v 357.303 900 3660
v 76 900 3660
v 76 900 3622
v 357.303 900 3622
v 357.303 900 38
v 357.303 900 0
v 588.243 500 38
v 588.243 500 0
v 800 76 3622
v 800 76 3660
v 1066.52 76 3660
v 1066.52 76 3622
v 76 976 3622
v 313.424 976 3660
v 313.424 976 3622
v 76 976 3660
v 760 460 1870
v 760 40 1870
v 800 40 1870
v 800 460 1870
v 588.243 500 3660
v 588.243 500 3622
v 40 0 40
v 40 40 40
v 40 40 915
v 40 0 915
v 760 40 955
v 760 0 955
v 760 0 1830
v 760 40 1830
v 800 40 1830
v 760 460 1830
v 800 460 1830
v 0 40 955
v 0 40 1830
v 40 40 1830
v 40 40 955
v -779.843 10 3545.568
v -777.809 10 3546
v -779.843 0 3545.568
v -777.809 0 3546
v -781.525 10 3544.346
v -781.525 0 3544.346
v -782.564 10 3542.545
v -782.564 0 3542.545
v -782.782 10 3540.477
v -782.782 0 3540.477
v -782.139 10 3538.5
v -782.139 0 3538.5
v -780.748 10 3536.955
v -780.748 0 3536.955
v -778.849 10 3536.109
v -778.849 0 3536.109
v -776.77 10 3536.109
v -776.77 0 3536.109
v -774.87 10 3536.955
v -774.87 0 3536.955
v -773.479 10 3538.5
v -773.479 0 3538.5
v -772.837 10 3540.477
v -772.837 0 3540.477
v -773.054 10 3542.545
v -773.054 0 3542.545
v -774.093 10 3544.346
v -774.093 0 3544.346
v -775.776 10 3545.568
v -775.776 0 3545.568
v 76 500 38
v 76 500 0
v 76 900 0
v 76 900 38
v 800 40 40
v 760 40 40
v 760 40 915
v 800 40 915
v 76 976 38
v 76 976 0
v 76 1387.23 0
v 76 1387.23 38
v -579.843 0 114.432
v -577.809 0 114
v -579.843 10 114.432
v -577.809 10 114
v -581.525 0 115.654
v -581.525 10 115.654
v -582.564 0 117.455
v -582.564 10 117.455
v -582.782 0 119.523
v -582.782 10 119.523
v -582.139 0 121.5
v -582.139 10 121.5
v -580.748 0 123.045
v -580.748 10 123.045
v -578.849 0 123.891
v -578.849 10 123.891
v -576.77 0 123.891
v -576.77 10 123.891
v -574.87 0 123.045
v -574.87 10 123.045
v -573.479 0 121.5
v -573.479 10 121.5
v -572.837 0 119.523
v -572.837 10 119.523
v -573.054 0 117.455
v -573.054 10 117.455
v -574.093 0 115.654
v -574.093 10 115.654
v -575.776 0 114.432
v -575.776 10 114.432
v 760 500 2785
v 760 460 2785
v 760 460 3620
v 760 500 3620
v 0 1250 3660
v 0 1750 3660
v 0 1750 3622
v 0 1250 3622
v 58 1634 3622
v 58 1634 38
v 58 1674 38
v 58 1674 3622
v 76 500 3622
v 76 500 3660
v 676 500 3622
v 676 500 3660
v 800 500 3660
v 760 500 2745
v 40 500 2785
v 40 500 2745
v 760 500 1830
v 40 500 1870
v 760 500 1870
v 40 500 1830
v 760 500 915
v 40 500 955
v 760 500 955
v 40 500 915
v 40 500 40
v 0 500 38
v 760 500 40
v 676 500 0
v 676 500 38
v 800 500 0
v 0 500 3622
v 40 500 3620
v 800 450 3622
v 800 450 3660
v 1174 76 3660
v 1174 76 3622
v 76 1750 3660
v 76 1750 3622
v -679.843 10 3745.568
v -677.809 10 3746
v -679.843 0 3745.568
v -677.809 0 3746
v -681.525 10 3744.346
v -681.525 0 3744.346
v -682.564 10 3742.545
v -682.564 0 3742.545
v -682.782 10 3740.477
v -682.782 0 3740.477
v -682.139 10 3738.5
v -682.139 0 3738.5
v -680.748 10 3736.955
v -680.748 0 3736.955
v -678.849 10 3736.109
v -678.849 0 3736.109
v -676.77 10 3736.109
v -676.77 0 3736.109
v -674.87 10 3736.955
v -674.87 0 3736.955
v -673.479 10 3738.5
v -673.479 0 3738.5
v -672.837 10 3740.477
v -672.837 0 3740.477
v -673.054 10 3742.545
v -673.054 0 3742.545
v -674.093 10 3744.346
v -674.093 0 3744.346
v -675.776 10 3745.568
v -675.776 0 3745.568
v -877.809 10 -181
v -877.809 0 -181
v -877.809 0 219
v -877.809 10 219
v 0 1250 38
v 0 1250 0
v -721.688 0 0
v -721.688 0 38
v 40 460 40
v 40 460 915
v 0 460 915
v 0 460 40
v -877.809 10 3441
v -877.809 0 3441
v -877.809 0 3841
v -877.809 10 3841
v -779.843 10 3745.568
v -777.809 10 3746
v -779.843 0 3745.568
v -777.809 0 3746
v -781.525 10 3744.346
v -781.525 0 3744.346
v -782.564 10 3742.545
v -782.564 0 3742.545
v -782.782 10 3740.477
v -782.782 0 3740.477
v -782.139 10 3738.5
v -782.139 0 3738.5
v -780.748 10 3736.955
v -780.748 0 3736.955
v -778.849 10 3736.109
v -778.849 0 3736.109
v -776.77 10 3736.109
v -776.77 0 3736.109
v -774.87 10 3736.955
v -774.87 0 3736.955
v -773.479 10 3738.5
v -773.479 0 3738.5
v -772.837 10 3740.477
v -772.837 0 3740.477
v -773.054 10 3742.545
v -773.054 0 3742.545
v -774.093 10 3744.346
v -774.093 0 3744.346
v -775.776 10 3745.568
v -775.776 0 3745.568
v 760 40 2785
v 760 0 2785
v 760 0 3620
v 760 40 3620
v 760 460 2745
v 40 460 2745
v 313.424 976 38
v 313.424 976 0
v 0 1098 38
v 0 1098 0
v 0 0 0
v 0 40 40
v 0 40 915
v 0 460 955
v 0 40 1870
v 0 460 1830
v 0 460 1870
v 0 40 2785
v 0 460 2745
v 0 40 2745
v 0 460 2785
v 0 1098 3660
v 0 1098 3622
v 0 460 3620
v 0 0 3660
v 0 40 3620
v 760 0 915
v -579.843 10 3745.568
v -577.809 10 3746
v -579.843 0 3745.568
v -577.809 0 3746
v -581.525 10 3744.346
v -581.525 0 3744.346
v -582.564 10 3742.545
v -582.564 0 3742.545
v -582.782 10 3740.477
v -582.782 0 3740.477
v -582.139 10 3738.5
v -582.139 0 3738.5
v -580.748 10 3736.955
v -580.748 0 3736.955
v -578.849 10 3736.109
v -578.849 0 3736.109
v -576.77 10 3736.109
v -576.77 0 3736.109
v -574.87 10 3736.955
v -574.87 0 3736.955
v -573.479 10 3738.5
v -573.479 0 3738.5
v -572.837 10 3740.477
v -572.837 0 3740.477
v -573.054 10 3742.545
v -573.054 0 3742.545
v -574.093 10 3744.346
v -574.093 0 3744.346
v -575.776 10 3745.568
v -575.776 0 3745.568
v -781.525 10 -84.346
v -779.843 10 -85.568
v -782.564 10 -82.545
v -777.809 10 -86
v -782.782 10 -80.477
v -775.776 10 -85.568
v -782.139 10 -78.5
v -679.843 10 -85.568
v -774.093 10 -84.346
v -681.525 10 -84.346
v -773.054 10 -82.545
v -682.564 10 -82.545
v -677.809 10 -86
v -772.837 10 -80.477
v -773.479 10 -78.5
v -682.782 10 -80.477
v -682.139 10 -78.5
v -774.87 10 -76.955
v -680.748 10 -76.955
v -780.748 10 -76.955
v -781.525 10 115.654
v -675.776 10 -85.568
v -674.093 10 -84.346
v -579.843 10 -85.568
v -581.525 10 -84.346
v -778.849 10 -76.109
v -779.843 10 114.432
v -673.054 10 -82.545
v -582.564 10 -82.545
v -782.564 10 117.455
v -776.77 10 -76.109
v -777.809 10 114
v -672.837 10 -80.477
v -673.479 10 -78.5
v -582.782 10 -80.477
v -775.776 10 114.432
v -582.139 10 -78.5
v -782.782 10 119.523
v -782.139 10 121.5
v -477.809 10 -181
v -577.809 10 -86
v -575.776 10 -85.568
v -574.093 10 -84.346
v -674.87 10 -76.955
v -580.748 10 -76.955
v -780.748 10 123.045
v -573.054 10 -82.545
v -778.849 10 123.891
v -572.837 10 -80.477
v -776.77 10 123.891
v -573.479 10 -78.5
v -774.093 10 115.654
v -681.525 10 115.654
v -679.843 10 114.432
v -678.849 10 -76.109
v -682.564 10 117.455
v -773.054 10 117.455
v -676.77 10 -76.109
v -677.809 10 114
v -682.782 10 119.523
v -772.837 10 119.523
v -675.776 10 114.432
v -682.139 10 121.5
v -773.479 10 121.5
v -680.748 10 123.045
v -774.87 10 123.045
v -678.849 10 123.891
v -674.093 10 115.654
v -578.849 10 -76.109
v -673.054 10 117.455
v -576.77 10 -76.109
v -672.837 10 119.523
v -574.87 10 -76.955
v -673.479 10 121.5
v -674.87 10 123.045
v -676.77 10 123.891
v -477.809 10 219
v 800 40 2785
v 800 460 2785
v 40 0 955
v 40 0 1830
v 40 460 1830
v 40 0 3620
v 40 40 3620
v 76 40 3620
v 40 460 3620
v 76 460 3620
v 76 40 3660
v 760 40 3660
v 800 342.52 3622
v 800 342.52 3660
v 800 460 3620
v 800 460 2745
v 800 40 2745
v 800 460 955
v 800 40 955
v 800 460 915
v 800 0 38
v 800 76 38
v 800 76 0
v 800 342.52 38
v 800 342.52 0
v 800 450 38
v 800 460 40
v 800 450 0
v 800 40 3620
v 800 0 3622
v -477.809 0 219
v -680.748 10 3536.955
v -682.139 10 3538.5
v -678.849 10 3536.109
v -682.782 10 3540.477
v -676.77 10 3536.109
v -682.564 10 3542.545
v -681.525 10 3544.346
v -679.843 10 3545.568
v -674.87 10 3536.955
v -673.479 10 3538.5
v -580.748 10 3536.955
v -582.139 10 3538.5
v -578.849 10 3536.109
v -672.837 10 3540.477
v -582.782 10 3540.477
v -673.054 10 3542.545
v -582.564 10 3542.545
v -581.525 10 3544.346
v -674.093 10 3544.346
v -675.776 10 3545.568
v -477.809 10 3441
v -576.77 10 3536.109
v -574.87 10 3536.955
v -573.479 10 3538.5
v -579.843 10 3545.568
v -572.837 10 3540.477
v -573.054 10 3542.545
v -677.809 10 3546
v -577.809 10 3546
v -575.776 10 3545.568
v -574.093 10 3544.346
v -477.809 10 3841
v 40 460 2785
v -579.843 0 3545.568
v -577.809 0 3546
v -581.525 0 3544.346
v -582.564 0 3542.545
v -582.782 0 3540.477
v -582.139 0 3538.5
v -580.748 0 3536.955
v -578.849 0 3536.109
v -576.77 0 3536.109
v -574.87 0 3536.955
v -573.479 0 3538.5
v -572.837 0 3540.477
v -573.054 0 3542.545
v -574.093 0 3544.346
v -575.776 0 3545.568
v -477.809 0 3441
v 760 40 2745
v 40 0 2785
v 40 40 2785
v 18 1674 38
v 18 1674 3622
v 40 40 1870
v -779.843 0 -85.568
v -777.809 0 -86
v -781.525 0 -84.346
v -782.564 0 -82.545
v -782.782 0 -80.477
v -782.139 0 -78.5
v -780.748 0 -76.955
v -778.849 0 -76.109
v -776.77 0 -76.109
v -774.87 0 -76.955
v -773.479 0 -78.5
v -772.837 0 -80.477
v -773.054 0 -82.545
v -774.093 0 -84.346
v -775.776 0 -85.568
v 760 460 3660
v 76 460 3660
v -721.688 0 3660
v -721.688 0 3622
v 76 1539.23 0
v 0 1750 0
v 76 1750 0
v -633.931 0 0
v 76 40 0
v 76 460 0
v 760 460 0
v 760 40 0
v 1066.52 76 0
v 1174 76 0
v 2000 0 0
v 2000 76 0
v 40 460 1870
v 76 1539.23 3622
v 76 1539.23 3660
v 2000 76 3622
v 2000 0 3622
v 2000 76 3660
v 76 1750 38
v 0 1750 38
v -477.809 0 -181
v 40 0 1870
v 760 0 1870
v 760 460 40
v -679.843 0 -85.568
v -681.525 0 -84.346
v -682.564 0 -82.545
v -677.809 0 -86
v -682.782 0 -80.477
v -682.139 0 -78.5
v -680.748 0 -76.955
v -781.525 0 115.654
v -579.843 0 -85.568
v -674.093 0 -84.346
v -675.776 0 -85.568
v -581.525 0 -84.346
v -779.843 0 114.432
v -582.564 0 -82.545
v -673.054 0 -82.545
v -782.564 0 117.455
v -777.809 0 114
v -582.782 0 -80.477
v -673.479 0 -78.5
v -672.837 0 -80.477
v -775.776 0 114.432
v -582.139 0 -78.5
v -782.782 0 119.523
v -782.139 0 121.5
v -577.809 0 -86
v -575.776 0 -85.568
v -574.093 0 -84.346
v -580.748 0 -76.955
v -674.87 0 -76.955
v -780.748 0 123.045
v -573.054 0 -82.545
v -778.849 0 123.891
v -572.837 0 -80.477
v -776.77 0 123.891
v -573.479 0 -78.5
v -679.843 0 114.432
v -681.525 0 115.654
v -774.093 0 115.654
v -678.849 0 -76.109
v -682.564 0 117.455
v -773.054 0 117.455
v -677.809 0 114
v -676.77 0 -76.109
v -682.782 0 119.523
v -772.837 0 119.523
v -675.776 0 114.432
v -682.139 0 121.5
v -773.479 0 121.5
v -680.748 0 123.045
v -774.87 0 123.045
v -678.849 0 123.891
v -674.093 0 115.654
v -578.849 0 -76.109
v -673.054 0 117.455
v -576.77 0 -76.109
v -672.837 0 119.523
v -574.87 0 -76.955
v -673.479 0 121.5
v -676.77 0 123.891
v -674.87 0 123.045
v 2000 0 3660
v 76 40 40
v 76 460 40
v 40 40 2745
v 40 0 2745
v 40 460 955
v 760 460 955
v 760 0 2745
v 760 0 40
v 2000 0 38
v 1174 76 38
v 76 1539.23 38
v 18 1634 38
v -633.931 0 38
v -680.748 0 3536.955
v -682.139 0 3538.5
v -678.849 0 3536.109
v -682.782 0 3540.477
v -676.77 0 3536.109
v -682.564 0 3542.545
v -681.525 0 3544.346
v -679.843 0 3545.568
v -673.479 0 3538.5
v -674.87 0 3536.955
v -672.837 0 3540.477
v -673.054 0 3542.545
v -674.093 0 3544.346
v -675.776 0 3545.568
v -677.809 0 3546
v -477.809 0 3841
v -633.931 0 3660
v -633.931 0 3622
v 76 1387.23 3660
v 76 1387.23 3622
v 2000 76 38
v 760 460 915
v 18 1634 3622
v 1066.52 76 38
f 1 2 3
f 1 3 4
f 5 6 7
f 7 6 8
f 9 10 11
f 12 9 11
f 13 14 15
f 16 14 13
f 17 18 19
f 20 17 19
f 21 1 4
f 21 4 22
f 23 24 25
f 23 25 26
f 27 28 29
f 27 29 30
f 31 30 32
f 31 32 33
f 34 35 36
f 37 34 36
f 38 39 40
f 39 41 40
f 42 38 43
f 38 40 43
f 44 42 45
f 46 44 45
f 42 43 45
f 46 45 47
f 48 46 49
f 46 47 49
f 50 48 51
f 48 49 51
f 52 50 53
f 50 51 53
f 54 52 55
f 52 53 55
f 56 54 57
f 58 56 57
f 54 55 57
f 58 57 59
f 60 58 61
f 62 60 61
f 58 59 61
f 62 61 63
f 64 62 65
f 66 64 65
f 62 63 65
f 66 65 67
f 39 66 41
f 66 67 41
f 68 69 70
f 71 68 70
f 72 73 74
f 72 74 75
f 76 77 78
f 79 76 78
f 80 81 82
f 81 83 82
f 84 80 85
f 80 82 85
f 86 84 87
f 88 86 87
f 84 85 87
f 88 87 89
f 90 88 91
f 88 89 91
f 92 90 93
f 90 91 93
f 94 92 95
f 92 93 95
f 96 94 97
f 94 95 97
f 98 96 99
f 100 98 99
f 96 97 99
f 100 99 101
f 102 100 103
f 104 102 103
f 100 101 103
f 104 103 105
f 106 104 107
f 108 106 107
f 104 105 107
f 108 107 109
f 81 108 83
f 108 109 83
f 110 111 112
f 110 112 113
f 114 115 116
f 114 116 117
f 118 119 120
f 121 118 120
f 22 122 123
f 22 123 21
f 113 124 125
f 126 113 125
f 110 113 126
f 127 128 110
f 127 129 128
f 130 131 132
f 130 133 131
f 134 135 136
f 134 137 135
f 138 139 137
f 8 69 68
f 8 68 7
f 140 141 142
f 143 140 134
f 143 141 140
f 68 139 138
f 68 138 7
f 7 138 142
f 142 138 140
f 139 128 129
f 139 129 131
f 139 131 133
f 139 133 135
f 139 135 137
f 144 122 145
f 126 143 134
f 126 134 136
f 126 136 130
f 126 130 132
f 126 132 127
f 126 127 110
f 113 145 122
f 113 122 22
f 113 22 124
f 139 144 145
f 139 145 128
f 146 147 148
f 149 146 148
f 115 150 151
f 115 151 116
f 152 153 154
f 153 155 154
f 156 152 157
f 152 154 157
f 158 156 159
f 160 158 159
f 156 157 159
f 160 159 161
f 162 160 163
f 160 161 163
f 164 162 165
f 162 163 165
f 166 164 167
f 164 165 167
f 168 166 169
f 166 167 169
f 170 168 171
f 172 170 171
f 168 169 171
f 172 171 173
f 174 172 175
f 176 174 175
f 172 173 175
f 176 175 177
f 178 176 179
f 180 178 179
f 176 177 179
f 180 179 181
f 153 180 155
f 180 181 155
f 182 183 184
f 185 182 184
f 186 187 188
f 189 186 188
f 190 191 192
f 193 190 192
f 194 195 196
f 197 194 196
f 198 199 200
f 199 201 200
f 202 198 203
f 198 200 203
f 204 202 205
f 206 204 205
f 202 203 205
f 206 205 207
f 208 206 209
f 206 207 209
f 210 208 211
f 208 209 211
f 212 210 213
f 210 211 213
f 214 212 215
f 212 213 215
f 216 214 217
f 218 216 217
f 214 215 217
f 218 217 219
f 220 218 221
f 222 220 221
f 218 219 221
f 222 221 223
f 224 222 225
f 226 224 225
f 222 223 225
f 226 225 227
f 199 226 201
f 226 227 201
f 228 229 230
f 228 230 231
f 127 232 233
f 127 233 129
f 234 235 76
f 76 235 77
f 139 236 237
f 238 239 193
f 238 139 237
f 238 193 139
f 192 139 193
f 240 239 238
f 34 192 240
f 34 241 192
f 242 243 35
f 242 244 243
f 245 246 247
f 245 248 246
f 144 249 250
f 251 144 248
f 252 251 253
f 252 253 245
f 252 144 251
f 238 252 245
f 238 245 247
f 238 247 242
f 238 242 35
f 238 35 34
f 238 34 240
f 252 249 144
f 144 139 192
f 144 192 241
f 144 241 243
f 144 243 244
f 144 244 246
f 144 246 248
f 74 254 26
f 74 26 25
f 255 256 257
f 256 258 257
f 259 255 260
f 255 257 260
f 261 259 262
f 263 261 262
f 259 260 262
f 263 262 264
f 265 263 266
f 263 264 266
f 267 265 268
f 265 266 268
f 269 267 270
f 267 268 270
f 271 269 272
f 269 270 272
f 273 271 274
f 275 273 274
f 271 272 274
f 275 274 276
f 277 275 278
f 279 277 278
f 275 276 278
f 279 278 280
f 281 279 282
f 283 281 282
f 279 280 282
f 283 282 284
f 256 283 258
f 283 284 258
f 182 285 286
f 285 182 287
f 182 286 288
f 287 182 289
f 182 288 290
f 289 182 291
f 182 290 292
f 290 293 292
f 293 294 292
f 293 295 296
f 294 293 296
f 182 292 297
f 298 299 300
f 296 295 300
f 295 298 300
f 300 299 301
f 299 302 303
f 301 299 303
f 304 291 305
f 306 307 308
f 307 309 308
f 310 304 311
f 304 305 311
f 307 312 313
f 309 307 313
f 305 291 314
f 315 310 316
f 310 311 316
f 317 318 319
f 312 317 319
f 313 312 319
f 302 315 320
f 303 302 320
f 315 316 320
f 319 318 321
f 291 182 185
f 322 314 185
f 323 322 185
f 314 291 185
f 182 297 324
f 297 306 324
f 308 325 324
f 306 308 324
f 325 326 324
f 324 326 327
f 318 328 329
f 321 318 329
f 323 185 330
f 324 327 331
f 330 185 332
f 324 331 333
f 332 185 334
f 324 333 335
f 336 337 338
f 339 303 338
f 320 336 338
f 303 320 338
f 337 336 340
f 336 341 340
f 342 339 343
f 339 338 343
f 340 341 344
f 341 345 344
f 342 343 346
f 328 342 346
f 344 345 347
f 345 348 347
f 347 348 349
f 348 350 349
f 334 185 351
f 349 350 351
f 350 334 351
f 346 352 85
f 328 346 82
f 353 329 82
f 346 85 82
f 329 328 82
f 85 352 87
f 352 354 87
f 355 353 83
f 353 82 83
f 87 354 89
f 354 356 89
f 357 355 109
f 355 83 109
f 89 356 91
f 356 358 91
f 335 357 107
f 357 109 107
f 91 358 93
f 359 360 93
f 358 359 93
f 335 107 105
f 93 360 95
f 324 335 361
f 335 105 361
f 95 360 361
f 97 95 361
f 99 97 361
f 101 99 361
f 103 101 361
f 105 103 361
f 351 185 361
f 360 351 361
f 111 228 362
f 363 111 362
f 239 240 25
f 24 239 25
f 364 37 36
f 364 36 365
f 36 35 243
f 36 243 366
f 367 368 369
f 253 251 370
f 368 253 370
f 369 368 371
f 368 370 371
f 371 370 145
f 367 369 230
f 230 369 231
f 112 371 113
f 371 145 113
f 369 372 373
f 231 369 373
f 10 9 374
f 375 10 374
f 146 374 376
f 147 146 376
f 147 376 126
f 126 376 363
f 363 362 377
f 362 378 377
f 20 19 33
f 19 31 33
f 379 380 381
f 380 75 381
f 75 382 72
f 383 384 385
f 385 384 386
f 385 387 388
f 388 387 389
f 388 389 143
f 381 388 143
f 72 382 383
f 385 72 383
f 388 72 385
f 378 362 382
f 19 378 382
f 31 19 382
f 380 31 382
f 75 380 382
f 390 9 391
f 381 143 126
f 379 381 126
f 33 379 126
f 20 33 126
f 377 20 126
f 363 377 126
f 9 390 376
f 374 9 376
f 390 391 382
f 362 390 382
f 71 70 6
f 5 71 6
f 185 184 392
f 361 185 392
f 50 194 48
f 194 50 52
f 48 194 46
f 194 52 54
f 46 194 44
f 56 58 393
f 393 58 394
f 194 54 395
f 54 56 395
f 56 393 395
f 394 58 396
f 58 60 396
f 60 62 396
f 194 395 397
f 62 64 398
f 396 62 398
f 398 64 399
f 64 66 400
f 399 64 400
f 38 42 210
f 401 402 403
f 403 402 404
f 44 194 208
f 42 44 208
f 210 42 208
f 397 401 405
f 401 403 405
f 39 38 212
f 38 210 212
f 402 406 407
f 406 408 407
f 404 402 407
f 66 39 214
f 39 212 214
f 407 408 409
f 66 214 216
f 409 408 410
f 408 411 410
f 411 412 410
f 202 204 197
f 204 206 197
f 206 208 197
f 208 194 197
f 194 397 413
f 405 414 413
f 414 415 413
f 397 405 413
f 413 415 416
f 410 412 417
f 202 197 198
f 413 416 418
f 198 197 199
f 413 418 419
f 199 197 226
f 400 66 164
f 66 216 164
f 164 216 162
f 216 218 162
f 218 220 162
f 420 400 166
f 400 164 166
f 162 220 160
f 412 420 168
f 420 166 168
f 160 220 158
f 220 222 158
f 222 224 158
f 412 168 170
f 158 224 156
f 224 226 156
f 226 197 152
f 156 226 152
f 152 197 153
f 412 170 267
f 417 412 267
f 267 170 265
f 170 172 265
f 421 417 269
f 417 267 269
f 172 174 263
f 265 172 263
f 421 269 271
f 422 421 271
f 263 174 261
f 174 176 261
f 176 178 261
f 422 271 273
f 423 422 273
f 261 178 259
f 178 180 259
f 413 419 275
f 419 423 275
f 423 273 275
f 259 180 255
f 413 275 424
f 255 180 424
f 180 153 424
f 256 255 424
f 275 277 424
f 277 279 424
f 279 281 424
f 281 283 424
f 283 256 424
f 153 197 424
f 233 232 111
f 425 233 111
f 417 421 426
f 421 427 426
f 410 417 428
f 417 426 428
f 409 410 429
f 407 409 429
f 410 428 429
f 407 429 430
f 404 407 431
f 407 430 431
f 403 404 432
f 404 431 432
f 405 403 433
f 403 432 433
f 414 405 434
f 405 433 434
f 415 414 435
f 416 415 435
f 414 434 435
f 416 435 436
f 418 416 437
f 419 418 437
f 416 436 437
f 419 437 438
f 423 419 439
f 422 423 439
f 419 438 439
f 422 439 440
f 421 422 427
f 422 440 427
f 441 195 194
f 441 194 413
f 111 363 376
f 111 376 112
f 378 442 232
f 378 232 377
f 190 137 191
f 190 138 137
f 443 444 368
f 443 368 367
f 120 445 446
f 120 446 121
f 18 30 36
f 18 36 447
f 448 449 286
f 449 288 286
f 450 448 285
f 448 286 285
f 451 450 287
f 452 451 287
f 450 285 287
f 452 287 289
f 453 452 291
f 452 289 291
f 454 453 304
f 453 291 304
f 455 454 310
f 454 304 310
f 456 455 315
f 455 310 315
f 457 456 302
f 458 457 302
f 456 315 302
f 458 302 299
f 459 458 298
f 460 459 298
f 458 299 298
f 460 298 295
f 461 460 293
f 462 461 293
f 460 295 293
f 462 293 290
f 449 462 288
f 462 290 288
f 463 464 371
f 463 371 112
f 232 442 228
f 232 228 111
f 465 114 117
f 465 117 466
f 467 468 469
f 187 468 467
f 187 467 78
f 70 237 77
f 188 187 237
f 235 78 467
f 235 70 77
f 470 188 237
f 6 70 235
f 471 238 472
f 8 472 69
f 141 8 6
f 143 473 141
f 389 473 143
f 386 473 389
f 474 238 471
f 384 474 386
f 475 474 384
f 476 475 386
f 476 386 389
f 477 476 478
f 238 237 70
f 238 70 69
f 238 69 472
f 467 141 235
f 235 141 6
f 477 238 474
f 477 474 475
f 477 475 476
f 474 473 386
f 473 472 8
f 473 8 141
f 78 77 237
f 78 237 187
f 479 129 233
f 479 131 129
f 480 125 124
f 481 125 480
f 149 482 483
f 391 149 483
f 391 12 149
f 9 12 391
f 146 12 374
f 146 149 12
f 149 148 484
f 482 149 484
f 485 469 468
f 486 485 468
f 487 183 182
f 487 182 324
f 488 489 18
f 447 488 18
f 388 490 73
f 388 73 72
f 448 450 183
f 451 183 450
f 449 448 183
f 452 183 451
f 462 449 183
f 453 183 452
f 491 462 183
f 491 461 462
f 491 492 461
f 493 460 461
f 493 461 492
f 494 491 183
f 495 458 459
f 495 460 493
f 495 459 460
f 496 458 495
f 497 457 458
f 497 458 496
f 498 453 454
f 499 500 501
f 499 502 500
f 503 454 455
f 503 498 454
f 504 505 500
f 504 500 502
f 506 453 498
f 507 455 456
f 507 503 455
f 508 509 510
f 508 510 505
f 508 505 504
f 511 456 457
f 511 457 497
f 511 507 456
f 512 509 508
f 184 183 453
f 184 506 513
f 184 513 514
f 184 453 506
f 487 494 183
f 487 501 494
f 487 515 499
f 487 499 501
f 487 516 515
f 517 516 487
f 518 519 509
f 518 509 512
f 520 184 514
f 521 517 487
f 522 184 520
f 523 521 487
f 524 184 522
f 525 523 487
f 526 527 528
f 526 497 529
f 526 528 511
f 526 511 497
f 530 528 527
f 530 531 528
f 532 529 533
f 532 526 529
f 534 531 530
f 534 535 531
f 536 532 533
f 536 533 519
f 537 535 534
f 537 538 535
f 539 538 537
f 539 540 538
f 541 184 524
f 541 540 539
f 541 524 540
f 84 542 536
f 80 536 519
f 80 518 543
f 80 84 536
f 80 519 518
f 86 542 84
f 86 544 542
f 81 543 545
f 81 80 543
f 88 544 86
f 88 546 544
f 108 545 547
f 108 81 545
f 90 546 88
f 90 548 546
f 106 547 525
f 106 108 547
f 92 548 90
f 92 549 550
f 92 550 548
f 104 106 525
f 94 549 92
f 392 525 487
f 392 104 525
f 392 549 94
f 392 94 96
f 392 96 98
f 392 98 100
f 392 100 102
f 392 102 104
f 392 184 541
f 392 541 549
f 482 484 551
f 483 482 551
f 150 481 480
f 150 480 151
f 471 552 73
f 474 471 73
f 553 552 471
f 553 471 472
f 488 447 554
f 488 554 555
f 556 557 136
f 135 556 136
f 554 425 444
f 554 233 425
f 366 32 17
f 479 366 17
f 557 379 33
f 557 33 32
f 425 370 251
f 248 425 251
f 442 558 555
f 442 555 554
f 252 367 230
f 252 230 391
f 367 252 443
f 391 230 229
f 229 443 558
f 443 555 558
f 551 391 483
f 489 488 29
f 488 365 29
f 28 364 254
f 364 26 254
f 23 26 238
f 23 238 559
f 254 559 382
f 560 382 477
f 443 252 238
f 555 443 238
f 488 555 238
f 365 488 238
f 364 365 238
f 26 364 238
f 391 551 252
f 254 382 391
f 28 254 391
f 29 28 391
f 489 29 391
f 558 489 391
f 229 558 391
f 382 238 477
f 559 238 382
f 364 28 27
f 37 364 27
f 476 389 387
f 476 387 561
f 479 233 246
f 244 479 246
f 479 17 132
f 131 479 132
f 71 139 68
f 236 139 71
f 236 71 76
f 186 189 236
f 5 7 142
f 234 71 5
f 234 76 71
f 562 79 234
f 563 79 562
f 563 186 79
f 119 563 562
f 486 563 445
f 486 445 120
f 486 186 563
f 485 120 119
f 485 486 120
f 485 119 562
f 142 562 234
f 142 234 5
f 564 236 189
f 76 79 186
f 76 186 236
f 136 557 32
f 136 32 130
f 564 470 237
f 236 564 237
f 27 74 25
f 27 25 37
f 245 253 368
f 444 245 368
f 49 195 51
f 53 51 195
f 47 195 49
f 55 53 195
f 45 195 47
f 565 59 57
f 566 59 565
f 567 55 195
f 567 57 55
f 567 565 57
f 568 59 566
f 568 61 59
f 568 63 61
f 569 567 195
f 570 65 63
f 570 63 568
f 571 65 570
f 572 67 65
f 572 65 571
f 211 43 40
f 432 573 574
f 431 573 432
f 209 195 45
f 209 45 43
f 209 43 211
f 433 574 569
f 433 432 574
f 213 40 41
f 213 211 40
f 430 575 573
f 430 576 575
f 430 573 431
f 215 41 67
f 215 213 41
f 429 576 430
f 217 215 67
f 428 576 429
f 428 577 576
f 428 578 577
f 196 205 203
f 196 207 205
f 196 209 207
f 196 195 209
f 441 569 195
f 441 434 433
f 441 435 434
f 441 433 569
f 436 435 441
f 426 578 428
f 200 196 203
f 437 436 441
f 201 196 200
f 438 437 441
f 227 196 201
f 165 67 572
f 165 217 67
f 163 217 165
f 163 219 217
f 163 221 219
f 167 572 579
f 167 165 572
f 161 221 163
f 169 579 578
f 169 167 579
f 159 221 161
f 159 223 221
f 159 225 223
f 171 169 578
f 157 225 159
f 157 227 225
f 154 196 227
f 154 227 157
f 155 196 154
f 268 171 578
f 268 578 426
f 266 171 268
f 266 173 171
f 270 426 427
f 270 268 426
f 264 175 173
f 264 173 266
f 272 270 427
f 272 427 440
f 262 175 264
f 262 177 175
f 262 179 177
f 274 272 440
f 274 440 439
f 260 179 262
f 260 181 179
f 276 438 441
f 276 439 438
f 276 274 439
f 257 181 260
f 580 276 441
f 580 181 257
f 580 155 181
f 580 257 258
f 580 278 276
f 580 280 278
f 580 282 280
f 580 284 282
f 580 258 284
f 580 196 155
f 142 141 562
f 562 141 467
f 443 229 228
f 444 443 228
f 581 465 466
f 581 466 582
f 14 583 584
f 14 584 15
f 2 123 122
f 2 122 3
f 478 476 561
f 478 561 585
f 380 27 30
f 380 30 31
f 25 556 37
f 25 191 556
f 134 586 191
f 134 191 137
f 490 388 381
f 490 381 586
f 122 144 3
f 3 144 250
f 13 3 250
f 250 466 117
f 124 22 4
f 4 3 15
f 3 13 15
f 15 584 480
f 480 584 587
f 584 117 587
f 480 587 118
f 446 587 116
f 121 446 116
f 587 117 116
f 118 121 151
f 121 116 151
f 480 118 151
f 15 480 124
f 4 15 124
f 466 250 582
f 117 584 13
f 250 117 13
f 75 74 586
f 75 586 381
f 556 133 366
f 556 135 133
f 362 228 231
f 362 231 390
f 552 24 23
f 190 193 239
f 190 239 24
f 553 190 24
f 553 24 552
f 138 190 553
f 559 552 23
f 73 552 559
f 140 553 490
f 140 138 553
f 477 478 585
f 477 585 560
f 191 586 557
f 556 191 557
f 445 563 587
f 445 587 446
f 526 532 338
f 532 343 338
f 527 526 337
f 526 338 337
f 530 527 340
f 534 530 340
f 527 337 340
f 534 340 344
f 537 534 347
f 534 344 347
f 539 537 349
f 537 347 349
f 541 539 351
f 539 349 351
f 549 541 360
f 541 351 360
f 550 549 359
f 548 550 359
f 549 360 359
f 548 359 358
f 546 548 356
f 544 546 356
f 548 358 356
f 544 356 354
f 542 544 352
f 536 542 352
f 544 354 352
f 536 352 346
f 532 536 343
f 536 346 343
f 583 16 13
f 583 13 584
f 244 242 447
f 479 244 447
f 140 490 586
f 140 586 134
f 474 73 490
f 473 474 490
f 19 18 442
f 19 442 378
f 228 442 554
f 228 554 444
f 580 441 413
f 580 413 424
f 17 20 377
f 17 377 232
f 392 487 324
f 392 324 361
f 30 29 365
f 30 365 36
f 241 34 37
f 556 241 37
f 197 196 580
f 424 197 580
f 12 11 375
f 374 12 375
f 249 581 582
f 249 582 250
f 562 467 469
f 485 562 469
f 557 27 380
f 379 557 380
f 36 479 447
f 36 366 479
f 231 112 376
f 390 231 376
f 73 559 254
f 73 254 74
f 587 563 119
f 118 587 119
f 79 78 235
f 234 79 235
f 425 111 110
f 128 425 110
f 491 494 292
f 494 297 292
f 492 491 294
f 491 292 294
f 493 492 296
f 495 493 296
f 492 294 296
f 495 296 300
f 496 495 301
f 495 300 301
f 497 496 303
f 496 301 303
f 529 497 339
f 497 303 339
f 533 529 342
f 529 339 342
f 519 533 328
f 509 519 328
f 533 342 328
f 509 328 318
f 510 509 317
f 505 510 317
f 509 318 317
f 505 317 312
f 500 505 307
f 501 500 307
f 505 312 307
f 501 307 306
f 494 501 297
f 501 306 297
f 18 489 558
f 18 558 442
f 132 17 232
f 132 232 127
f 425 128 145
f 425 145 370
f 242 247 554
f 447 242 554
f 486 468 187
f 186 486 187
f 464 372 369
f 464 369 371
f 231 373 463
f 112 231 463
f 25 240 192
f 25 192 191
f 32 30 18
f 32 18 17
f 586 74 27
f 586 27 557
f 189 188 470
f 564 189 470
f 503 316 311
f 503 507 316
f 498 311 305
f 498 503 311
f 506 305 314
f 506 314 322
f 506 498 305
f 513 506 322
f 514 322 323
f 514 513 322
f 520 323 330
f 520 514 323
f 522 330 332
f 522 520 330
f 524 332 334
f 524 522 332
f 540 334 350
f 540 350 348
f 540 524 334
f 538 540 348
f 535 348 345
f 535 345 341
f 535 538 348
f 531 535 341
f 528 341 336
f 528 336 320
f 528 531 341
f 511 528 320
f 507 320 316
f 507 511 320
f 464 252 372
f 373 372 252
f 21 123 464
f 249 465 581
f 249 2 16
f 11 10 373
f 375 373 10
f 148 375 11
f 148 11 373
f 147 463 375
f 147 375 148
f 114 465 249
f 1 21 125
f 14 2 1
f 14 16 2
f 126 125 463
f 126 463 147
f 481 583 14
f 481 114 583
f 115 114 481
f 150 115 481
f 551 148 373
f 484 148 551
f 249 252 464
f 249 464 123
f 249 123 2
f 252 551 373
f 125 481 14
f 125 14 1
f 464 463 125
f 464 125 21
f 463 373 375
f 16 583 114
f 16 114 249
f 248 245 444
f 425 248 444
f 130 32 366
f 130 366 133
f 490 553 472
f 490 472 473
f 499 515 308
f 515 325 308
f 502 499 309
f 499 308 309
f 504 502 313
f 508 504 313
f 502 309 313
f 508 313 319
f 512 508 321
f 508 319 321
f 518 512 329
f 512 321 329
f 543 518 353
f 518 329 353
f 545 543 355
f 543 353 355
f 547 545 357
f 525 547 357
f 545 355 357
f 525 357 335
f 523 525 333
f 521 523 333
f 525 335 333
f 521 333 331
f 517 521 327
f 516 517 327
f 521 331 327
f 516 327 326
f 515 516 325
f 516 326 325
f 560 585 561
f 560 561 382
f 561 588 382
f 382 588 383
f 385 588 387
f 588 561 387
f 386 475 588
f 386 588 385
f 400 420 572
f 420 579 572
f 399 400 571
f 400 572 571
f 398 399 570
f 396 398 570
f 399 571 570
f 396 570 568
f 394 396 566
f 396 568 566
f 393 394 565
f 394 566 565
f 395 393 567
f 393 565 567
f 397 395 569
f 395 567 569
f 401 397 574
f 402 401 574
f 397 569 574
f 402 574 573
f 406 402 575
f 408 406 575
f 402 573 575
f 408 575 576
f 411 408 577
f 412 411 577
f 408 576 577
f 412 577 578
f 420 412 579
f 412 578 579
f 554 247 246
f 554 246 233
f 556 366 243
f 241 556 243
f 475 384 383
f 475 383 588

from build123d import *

# Parameters (mm, degrees)
SKETCH1_W               = 800
SKETCH1_H               = 500
BOSS_EXTRUDE5_DEPTH     = 3660
BOSS_EXTRUDE5_2_DEPTH   = 3660
BOSS_EXTRUDE2_DEPTH     = 38
SKETCH4_W               = 684
SKETCH4_H               = 420
CUT_EXTRUDE1_DEPTH      = 3661
CUT_EXTRUDE2_DEPTH      = 1790
CUT_EXTRUDE2_DEPTH_BACK = 1790
BOSS_EXTRUDE3_DEPTH     = 76
SKETCH9_W               = 400
SKETCH9_H               = 400
BOSS_EXTRUDE6_DEPTH     = 10
BOSS_EXTRUDE6_2_DEPTH   = 10
SKETCH11_W              = 40
SKETCH11_H              = 40
BOSS_EXTRUDE7_DEPTH     = 3584
SKETCH12_W              = 40
SKETCH12_H              = 40
BOSS_EXTRUDE8_DEPTH     = 420
LPATTERN1_COUNT         = 4
LPATTERN1_PITCH         = 915
LPATTERN1_COUNT_DIR2    = 2
LPATTERN1_PITCH_DIR2    = 760
SKETCH13_W              = 40
SKETCH13_H              = 40
BOSS_EXTRUDE9_DEPTH     = 760
LPATTERN2_COUNT         = 4
LPATTERN2_PITCH         = 915
LPATTERN2_COUNT_DIR2    = 2
LPATTERN2_PITCH_DIR2    = 460
SKETCH14_W              = 4140.847934345
SKETCH14_H              = 3535.849458551
CUT_EXTRUDE3_DEPTH      = 182
CUT_EXTRUDE3_DEPTH_BACK = 3842
SKETCH17_W              = 5
SKETCH17_H              = 10
LPATTERN3_COUNT         = 2
LPATTERN3_PITCH         = 200
LPATTERN3_COUNT_DIR2    = 3
LPATTERN3_PITCH_DIR2    = 100
MIRROR3_COPY_1_SKETCH_W = 5
MIRROR3_COPY_1_SKETCH_H = 10
MIRROR3_COPY_2_SKETCH_W = 5
MIRROR3_COPY_2_SKETCH_H = 10
MIRROR3_COPY_3_SKETCH_W = 5
MIRROR3_COPY_3_SKETCH_H = 10
MIRROR3_COPY_4_SKETCH_W = 5
MIRROR3_COPY_4_SKETCH_H = 10
MIRROR3_COPY_5_SKETCH_W = 5
MIRROR3_COPY_5_SKETCH_H = 10


with BuildPart() as part:
    # Sketch1 → Boss-Extrude5 (new body)
    with BuildSketch(Plane.XY):
        with Locations((400, 250)):
            Rectangle(SKETCH1_W, SKETCH1_H)
    extrude(amount=BOSS_EXTRUDE5_DEPTH)

    # Sketch3 → Boss-Extrude2 (add)
    with BuildSketch(Plane.XY):
        Polygon((0, 500), (76, 500), (76, 900), (357.302651407, 900), (588.242759083, 500), (676, 500), (76, 1539.230484541), (76, 1750), (0, 1750), (0, 1250), (-721.687836487, 0), (-633.93059557, 0), (0, 1098), align=None)
        Polygon((76, 1387.230484541), (313.424030949, 976), (76, 976), align=None, mode=Mode.SUBTRACT)
        Polygon((800, 450), (1174, 76), (2000, 76), (2000, 0), (800, 0), (800, 76), (1066.51976926, 76), (800, 342.51976926), align=None)
    boss_extrude2 = extrude(amount=BOSS_EXTRUDE2_DEPTH)

    # Mirror1: Boss-Extrude2 across plane
    add(boss_extrude2.mirror(Plane.XY.offset(1830)))

    # Sketch4 → Cut-Extrude1 (cut, through all)
    with BuildSketch(Plane.XY.offset(3660)):
        with Locations((418, 250)):
            Rectangle(SKETCH4_W, SKETCH4_H)
    extrude(amount=-CUT_EXTRUDE1_DEPTH, mode=Mode.SUBTRACT)

    # Sketch5 → Cut-Extrude2 (cut, two sides)
    with BuildSketch(Plane.XY.offset(1830)) as cut_extrude2_sk:
        Polygon((40, 500), (40, 460), (0, 460), (0, 40), (40, 40), (40, 0), (760, 0), (760, 40), (800, 40), (800, 460), (760, 460), (760, 500), align=None)
    extrude(amount=CUT_EXTRUDE2_DEPTH, mode=Mode.SUBTRACT)
    extrude(cut_extrude2_sk.sketch, amount=-CUT_EXTRUDE2_DEPTH_BACK, mode=Mode.SUBTRACT)

    # Sketch11 → Boss-Extrude7 (add)
    with BuildSketch(Plane.XY.offset(38)):
        with Locations((38, 1654)):
            Rectangle(SKETCH11_W, SKETCH11_H)
    extrude(amount=BOSS_EXTRUDE7_DEPTH)

    # Sketch12 → Boss-Extrude8 (add)
    with BuildSketch(Plane(origin=(0, 40, 0), x_dir=(1, 0, 0), z_dir=(0, 1, 0))):
        with Locations((20, -20)):
            Rectangle(SKETCH12_W, SKETCH12_H)
    boss_extrude8 = extrude(amount=BOSS_EXTRUDE8_DEPTH)

    # LPattern1: Boss-Extrude8 4 × 2
    with Locations(*[(j * LPATTERN1_PITCH_DIR2, 0, i * LPATTERN1_PITCH) for i in range(LPATTERN1_COUNT) for j in range(LPATTERN1_COUNT_DIR2) if (i, j) != (0, 0)]):
        add(boss_extrude8)

    # Sketch13 → Boss-Extrude9 (add)
    with BuildSketch(Plane.ZY.offset(-760)):
        with Locations((20, 480)):
            Rectangle(SKETCH13_W, SKETCH13_H)
    boss_extrude9 = extrude(amount=BOSS_EXTRUDE9_DEPTH)

    # LPattern2: Boss-Extrude9 4 × 2
    with Locations(*[(0, -j * LPATTERN2_PITCH_DIR2, i * LPATTERN2_PITCH) for i in range(LPATTERN2_COUNT) for j in range(LPATTERN2_COUNT_DIR2) if (i, j) != (0, 0)]):
        add(boss_extrude9)


with BuildPart() as body_2:
    # Sketch1 → Boss-Extrude5 2 (new body)
    with BuildSketch(Plane.XY):
        Polygon((2614.411542732, 3678.652977851), (2630, 3669.652977851), (800, 500), (784.411542732, 509), align=None)
    extrude(amount=BOSS_EXTRUDE5_2_DEPTH)


with BuildPart() as body_3:
    # Sketch7 → Boss-Extrude3 (new body)
    with BuildSketch(Plane(origin=(367.905191786, -212.410161514, 0), x_dir=(0, 0, 1), z_dir=(-0.866025404, 0.5, 0))):
        Polygon((1830, 833.012701892), (0, 833.012701892), (0, 4493.012701892), (1830, 4493.012701892), (1830, 4455.012701892), (38, 4455.012701892), (38, 871.012701892), (1830, 871.012701892), align=None)
    boss_extrude3 = extrude(amount=BOSS_EXTRUDE3_DEPTH)

    # Mirror2: Boss-Extrude3 across plane
    add(boss_extrude3.mirror(Plane.XY.offset(1830)))


with BuildPart() as body_4:
    # Sketch9 → Boss-Extrude6 (new body)
    with BuildSketch(Plane.XZ):
        with Locations((-677.809216029, 3641)):
            Rectangle(SKETCH9_W, SKETCH9_H)
    extrude(amount=-BOSS_EXTRUDE6_DEPTH)

    # Sketch17 → Ø10.0mm Dowel Hole1 (revolve, cut)
    with BuildSketch(Plane(origin=(-777.809216029, 10, 3541), x_dir=(0, 0, 1), z_dir=(1, 0, 0))):
        with Locations((2.5, 5)):
            Rectangle(SKETCH17_W, SKETCH17_H)
    f_10_0mm_dowel_hole1 = revolve(axis=Axis((-777.809216029, 16.35, 3541), (0, -1, 0)), mode=Mode.SUBTRACT)

    # LPattern3: 10.0mm Dowel Hole1 2 × 3
    with Locations(*[(j * LPATTERN3_PITCH_DIR2, 0, i * LPATTERN3_PITCH) for i in range(LPATTERN3_COUNT) for j in range(LPATTERN3_COUNT_DIR2) if (i, j) != (0, 0)]):
        add(f_10_0mm_dowel_hole1, mode=Mode.SUBTRACT)


with BuildPart() as body_5:
    # Sketch9 → Boss-Extrude6 2 (new body)
    with BuildSketch(Plane.XZ):
        with Locations((-677.809216029, 19)):
            Rectangle(SKETCH9_W, SKETCH9_H)
    extrude(amount=-BOSS_EXTRUDE6_2_DEPTH)

    # Mirror3: Ø10.0mm Dowel Hole1 across plane
    add(f_10_0mm_dowel_hole1.mirror(Plane.XY.offset(1830)), mode=Mode.SUBTRACT)

    # Mirror3 copy 1 sketch → Mirror3 copy 1 (revolve, cut)
    with BuildSketch(Plane(origin=(-677.809216029, 10, 119), x_dir=(0, 0, -1), z_dir=(1, 0, 0))):
        with Locations((2.5, -5)):
            Rectangle(MIRROR3_COPY_1_SKETCH_W, MIRROR3_COPY_1_SKETCH_H)
    revolve(axis=Axis((-677.809216029, 16.35, 119), (0, 1, 0)), mode=Mode.SUBTRACT)

    # Mirror3 copy 2 sketch → Mirror3 copy 2 (revolve, cut)
    with BuildSketch(Plane(origin=(-577.809216029, 10, 119), x_dir=(0, 0, -1), z_dir=(1, 0, 0))):
        with Locations((2.5, -5)):
            Rectangle(MIRROR3_COPY_2_SKETCH_W, MIRROR3_COPY_2_SKETCH_H)
    revolve(axis=Axis((-577.809216029, 16.35, 119), (0, 1, 0)), mode=Mode.SUBTRACT)

    # Mirror3 copy 3 sketch → Mirror3 copy 3 (revolve, cut)
    with BuildSketch(Plane(origin=(-777.809216029, 10, -81), x_dir=(0, 0, -1), z_dir=(1, 0, 0))):
        with Locations((2.5, -5)):
            Rectangle(MIRROR3_COPY_3_SKETCH_W, MIRROR3_COPY_3_SKETCH_H)
    revolve(axis=Axis((-777.809216029, 16.35, -81), (0, 1, 0)), mode=Mode.SUBTRACT)

    # Mirror3 copy 4 sketch → Mirror3 copy 4 (revolve, cut)
    with BuildSketch(Plane(origin=(-677.809216029, 10, -81), x_dir=(0, 0, -1), z_dir=(1, 0, 0))):
        with Locations((2.5, -5)):
            Rectangle(MIRROR3_COPY_4_SKETCH_W, MIRROR3_COPY_4_SKETCH_H)
    revolve(axis=Axis((-677.809216029, 16.35, -81), (0, 1, 0)), mode=Mode.SUBTRACT)

    # Mirror3 copy 5 sketch → Mirror3 copy 5 (revolve, cut)
    with BuildSketch(Plane(origin=(-577.809216029, 10, -81), x_dir=(0, 0, -1), z_dir=(1, 0, 0))):
        with Locations((2.5, -5)):
            Rectangle(MIRROR3_COPY_5_SKETCH_W, MIRROR3_COPY_5_SKETCH_H)
    revolve(axis=Axis((-577.809216029, 16.35, -81), (0, 1, 0)), mode=Mode.SUBTRACT)


with BuildPart() as cut_extrude3_tool:
    # Sketch14 → Cut-Extrude3 (new body, two sides)
    with BuildSketch(Plane.XY.offset(3660)) as cut_extrude3_sk:
        with Locations((2687.602754195, 2267.924729276)):
            Rectangle(SKETCH14_W, SKETCH14_H)
    extrude(amount=CUT_EXTRUDE3_DEPTH)
    extrude(cut_extrude3_sk.sketch, amount=-CUT_EXTRUDE3_DEPTH_BACK)


with BuildPart() as body_3_1:
    add(body_3.part)

    # Cut-Extrude3: cut by cut_extrude3_tool
    add(cut_extrude3_tool.part, mode=Mode.SUBTRACT)


with BuildPart() as body_2_1:
    add(body_2.part)

    # Cut-Extrude3: cut by cut_extrude3_tool
    add(cut_extrude3_tool.part, mode=Mode.SUBTRACT)


solid = Compound([part.part, body_4.part, body_5.part])
